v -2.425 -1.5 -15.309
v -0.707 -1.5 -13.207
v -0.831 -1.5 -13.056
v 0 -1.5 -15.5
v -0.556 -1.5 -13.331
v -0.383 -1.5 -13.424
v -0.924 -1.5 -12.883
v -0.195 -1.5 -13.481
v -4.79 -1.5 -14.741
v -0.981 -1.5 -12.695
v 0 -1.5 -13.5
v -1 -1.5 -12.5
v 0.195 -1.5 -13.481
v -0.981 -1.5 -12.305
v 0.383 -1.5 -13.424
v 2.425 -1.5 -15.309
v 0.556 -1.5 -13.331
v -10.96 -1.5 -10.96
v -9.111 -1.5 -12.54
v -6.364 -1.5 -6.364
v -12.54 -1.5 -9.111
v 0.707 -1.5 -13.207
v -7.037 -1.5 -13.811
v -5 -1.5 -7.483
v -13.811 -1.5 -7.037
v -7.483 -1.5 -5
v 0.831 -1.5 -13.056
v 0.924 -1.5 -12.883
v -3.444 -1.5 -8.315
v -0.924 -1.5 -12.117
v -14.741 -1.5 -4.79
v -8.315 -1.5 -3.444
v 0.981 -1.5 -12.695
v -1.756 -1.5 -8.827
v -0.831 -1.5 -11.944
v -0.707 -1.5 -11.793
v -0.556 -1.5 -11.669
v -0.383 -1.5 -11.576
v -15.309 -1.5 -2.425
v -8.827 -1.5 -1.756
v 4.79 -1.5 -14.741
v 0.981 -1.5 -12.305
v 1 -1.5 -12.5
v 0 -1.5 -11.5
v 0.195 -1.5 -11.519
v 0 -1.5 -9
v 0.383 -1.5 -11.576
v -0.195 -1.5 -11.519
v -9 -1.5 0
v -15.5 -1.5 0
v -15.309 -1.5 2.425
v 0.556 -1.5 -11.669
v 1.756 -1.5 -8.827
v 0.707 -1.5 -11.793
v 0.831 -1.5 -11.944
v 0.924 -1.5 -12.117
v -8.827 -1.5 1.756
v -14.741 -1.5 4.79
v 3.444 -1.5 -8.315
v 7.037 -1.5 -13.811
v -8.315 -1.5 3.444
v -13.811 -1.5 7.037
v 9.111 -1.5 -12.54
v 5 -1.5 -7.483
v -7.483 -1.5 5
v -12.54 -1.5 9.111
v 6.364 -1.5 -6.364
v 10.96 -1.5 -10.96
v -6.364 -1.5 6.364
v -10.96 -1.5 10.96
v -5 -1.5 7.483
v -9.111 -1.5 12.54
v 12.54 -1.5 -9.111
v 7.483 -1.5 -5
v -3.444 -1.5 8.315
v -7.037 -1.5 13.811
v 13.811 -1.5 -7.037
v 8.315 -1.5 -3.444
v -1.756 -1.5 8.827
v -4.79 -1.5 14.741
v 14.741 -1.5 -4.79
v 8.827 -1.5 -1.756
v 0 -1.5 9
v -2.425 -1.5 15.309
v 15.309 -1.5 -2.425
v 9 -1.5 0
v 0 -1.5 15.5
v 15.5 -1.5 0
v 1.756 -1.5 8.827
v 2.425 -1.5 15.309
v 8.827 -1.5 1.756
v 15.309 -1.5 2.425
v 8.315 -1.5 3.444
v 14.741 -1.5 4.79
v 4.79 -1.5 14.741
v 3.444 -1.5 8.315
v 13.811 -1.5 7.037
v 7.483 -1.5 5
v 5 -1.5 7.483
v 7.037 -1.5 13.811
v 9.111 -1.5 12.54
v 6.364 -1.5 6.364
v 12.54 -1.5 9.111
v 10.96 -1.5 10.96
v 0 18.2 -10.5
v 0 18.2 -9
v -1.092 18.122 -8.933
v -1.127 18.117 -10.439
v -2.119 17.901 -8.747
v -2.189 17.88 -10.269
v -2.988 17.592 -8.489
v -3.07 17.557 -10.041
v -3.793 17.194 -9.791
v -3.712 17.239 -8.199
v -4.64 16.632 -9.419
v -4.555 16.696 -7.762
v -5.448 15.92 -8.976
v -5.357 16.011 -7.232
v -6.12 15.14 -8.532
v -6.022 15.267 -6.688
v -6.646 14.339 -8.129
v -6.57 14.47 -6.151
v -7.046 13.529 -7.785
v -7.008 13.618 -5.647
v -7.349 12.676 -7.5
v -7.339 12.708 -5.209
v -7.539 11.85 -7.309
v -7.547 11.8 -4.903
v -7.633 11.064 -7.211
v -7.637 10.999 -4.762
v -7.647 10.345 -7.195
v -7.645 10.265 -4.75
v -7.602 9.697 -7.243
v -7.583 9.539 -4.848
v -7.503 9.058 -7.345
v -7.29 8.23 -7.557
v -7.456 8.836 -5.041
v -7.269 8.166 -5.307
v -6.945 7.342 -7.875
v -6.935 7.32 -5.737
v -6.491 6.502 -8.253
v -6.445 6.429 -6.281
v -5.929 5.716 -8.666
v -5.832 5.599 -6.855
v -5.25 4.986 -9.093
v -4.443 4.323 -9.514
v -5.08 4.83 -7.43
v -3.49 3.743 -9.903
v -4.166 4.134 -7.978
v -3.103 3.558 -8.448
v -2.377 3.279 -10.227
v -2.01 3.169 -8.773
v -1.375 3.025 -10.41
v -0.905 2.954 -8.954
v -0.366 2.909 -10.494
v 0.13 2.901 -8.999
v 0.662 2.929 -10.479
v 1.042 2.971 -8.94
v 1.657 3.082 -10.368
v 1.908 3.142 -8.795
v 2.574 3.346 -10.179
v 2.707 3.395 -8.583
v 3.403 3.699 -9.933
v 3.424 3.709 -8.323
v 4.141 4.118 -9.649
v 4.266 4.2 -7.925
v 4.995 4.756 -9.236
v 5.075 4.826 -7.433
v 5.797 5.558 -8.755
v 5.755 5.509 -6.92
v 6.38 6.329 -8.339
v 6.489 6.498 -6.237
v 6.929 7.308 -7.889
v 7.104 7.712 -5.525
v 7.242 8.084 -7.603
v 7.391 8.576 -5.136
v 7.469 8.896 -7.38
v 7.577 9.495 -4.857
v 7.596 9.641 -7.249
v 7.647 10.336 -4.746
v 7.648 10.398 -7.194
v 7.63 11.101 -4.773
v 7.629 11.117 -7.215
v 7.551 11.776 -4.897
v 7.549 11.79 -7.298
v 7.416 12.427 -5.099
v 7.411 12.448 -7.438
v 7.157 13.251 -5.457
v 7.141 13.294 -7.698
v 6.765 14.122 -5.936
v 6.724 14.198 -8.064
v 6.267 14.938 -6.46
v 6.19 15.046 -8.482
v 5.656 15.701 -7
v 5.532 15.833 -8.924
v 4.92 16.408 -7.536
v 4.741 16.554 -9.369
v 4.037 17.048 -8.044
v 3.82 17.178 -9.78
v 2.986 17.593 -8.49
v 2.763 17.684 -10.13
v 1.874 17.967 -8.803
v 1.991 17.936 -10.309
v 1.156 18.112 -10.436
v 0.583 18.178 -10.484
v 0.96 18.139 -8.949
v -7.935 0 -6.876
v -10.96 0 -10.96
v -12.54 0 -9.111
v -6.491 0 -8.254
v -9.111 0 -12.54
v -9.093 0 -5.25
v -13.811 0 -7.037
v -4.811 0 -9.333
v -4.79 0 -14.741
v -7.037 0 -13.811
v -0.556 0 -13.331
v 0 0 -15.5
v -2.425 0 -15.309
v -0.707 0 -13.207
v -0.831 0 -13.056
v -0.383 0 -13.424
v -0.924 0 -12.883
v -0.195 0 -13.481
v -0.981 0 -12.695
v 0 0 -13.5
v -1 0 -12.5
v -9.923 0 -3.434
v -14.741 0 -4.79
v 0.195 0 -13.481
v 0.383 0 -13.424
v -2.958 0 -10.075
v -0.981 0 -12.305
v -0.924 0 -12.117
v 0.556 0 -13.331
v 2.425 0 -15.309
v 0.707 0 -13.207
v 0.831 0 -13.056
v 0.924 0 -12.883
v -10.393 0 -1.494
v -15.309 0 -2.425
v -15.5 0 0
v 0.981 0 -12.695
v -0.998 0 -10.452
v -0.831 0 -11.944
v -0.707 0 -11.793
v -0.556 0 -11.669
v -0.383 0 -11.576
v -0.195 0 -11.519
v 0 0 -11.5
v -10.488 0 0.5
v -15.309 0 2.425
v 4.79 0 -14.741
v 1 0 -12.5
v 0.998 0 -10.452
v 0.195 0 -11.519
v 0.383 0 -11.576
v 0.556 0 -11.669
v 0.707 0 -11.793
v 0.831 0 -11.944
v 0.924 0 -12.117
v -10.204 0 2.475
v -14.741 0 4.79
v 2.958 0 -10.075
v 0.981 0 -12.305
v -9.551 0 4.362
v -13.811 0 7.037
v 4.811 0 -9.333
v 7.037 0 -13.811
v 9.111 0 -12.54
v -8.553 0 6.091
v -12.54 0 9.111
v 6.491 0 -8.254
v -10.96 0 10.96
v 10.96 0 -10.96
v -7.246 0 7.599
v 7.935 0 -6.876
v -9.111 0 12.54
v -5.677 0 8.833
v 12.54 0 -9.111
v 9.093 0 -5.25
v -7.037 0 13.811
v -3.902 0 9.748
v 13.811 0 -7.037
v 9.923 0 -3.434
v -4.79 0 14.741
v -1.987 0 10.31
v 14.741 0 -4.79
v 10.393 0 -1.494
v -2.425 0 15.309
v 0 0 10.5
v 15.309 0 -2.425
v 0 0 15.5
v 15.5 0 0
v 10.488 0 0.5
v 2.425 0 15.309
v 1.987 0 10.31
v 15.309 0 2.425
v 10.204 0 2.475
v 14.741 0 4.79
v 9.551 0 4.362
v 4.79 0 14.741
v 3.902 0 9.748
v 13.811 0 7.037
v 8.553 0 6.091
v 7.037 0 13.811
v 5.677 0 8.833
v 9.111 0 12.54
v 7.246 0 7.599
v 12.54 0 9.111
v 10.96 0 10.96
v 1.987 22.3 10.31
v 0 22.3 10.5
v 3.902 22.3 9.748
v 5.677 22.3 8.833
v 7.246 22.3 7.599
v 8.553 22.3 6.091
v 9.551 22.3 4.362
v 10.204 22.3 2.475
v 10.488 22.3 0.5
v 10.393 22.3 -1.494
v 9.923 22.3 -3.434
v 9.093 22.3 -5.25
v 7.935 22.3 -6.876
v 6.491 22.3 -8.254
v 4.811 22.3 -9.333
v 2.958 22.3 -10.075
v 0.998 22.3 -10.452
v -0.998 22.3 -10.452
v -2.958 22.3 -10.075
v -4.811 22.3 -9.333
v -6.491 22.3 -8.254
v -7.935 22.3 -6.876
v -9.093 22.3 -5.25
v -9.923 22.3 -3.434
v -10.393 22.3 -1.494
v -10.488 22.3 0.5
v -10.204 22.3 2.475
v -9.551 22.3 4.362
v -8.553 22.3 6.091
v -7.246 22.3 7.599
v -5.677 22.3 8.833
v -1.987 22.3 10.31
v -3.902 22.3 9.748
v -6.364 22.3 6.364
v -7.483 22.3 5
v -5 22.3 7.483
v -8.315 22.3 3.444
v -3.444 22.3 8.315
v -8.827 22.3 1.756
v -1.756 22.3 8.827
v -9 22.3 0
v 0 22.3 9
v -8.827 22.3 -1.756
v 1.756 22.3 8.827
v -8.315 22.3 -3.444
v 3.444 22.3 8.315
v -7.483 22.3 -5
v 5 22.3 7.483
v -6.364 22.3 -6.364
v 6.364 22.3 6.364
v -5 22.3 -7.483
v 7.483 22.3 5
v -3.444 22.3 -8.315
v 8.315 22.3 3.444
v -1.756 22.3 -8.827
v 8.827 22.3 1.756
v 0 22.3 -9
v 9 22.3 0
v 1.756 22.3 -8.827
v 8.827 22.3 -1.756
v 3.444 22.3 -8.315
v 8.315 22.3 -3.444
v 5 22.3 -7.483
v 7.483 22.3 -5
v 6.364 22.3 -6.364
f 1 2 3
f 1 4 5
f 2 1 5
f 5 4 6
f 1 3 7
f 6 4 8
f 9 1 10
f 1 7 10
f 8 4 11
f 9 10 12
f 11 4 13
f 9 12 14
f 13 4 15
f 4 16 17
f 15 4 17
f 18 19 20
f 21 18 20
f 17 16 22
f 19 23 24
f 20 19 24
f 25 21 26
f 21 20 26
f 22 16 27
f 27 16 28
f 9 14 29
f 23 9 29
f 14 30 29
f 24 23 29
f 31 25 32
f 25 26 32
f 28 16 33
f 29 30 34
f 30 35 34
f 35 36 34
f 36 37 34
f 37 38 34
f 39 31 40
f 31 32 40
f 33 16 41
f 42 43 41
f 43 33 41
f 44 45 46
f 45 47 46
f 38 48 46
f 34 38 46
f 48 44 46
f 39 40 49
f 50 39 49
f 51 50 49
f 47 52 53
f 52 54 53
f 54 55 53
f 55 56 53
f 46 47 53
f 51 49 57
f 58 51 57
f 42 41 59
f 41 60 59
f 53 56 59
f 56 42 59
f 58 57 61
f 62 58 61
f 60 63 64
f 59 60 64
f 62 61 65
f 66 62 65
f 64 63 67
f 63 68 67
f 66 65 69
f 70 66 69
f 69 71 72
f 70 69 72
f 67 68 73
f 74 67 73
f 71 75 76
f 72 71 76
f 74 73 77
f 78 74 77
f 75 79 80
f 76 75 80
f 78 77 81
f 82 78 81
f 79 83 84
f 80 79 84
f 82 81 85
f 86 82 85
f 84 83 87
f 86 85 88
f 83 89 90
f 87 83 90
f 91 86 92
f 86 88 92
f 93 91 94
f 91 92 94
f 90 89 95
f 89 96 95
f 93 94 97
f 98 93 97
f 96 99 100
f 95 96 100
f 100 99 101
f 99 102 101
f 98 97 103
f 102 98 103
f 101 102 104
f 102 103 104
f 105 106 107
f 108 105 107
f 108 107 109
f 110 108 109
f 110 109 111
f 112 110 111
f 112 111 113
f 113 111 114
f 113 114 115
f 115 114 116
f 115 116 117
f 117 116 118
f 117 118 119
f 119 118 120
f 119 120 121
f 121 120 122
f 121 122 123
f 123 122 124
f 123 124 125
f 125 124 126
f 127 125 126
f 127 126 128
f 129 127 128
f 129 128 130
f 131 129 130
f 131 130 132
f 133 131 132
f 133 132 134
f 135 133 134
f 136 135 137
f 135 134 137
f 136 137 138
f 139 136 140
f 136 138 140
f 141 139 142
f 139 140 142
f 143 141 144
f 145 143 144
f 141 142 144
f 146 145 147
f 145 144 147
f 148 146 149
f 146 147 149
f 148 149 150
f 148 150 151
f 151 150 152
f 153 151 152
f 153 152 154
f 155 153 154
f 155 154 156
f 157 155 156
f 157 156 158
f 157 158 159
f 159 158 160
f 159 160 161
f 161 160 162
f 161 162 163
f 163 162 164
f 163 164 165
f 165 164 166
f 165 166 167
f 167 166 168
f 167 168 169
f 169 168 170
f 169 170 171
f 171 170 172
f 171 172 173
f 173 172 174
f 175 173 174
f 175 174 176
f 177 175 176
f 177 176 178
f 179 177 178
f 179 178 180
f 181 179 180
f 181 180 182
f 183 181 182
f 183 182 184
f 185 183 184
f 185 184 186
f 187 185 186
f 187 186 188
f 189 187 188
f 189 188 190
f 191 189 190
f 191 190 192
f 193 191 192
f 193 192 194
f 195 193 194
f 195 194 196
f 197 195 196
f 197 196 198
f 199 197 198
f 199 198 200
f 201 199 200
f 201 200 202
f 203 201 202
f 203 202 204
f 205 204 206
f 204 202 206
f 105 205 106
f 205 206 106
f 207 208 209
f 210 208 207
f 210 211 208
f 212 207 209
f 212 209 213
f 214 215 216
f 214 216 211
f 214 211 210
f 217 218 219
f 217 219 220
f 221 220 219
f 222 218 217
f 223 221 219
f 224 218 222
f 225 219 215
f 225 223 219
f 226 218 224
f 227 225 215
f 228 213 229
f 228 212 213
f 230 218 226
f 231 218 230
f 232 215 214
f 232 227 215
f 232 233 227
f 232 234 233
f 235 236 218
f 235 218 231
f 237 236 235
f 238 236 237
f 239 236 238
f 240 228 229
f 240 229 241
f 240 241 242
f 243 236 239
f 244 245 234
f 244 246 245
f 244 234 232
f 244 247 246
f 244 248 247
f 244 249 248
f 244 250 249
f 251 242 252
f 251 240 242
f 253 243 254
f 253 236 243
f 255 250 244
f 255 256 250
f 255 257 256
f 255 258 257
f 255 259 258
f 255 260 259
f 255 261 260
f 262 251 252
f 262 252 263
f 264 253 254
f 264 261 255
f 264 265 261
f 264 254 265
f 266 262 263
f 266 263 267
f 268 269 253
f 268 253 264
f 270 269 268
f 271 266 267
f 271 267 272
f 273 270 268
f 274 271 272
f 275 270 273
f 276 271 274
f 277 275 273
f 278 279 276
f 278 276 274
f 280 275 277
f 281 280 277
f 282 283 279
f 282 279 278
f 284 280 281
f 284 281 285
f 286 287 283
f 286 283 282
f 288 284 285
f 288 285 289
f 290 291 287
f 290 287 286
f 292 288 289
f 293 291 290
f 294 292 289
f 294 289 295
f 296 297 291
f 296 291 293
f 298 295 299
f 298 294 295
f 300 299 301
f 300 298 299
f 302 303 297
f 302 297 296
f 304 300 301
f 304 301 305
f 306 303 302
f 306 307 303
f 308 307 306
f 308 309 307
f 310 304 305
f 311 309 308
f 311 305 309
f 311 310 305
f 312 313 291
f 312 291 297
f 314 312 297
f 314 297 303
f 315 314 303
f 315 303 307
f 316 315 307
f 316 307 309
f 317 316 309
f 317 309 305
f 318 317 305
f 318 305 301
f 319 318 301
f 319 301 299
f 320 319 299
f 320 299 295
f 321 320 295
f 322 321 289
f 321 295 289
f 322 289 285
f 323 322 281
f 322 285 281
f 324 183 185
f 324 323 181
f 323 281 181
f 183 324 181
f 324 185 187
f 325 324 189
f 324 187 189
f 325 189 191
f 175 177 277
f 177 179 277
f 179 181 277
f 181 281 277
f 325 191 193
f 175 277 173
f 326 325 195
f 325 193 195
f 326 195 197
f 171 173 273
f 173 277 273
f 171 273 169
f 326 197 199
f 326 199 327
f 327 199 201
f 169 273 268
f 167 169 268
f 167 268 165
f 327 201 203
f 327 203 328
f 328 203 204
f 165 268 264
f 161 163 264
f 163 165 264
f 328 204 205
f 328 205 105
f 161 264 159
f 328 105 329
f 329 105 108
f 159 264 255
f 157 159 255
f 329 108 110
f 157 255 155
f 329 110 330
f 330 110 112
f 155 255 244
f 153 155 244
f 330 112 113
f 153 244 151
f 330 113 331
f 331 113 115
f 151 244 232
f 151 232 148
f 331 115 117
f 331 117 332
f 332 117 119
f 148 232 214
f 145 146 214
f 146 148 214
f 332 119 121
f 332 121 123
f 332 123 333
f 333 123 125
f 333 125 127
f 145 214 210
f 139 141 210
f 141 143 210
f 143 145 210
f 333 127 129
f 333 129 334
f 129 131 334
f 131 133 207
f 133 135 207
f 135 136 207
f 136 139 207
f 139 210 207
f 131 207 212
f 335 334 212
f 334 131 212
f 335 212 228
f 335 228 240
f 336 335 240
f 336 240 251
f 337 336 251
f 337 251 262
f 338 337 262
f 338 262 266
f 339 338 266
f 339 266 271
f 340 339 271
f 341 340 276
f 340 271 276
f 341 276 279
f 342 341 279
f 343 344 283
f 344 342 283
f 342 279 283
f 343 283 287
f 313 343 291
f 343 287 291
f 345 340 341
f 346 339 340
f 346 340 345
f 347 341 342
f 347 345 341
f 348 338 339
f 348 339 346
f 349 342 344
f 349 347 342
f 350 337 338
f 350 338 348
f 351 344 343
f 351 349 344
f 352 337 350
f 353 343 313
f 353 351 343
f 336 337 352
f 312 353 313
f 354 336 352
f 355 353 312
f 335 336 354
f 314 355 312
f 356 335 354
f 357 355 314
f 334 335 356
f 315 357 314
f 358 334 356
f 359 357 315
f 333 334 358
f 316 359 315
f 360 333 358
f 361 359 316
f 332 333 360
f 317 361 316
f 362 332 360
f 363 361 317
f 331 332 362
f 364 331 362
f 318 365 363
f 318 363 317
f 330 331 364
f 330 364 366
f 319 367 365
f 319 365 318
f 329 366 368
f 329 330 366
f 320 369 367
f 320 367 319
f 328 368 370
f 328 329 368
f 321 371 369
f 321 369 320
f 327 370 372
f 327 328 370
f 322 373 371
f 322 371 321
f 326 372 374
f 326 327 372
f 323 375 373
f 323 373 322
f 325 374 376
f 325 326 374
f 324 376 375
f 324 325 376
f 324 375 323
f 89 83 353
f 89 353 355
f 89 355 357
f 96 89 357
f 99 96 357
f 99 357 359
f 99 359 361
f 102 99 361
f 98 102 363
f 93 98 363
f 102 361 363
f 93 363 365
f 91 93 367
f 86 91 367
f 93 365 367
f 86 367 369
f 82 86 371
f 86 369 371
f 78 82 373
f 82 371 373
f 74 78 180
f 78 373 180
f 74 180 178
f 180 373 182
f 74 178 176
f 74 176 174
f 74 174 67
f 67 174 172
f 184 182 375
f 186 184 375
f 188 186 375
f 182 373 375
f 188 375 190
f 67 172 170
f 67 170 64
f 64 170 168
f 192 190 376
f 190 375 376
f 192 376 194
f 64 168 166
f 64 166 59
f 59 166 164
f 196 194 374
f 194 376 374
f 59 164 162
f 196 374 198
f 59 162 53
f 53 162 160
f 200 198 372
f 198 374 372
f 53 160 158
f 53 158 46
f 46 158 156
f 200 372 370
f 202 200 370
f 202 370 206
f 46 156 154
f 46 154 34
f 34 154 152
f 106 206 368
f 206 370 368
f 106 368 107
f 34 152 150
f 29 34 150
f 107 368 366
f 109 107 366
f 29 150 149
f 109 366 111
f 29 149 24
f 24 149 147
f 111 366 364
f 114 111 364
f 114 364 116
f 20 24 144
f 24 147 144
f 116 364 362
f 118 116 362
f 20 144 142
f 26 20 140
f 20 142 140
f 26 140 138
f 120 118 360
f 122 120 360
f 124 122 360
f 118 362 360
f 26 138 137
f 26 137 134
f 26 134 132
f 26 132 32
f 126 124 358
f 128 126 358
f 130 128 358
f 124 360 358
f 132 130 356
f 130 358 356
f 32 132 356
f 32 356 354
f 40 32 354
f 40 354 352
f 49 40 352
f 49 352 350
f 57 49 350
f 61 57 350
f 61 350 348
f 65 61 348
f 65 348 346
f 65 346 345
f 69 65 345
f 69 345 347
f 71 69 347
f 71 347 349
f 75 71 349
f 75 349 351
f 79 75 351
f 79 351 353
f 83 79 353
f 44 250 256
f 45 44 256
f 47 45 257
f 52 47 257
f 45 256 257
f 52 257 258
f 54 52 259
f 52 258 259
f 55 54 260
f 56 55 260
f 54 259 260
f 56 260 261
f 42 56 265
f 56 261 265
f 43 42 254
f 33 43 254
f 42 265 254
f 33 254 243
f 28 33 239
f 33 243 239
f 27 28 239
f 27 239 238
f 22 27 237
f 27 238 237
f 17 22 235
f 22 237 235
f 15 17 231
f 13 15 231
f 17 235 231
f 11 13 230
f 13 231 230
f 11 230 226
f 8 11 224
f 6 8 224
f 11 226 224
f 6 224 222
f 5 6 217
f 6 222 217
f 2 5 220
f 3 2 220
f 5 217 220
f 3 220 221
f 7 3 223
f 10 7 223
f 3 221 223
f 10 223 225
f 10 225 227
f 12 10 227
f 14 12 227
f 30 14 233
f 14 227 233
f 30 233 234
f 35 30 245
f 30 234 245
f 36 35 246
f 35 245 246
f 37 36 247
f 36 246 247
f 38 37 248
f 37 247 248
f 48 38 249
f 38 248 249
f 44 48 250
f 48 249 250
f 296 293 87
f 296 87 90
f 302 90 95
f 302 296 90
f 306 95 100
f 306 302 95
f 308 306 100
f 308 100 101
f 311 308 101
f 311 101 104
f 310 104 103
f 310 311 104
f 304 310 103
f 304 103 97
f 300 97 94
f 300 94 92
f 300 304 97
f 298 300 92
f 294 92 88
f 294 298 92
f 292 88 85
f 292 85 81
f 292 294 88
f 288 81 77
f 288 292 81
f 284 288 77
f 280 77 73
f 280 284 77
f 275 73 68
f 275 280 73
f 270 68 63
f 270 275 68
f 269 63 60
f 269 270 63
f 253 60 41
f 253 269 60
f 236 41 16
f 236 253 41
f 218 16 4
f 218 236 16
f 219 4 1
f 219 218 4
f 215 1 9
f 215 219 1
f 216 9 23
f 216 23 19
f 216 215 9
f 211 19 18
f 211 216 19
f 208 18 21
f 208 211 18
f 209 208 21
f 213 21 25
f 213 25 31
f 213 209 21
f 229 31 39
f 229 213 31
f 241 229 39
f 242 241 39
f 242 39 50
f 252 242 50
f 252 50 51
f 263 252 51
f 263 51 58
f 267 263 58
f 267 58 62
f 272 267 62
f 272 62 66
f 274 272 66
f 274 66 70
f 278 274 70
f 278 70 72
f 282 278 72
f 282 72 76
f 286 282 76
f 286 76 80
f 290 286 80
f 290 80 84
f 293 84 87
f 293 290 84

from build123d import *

# Parameters (mm, degrees)
SKETCH1_R           = 10.5
SKETCH1_R_2         = 9
BOSS_EXTRUDE1_DEPTH = 38.3
SKETCH2_R           = 15.5
SKETCH2_R_2         = 9
SKETCH2_R_3         = 1
BOSS_EXTRUDE2_DEPTH = 1.5
SKETCH10_R          = 7.65
CUT_EXTRUDE1_DEPTH  = 46.437209421
SKETCH15_R          = 20.755300819
CUT_EXTRUDE3_DEPTH  = 17.5


with BuildPart() as part:
    # Sketch1 → Boss-Extrude1 (new body)
    with BuildSketch(Plane(origin=(0, 0, 0), x_dir=(1, 0, 0), z_dir=(0, 1, 0))):
        with Locations(Location((0, 0, 0), (0, 0, 270))):
            Circle(SKETCH1_R)
        with Locations(Location((0, 0, 0), (0, 0, 270))):
            Circle(SKETCH1_R_2, mode=Mode.SUBTRACT)
    extrude(amount=BOSS_EXTRUDE1_DEPTH)

    # Sketch2 → Boss-Extrude2 (add)
    with BuildSketch(Plane(origin=(0, 38.3, 0), x_dir=(1, 0, 0), z_dir=(0, 1, 0))):
        with Locations(Location((0, 0, 0), (0, 0, 270))):
            Circle(SKETCH2_R)
        with Locations(Location((0, 0, 0), (0, 0, 270))):
            Circle(SKETCH2_R_2, mode=Mode.SUBTRACT)
        with Locations(Location((0, 12.5, 0), (0, 0, 270))):
            Circle(SKETCH2_R_3, mode=Mode.SUBTRACT)
    boss_extrude2 = extrude(amount=BOSS_EXTRUDE2_DEPTH)

    # Mirror1: Boss-Extrude2 across plane
    add(boss_extrude2.mirror(Plane(origin=(0, 19.15, 0), x_dir=(0, 0, 1), z_dir=(0, -1, 0))))

    # Sketch10 → Cut-Extrude1 (cut, through all)
    with BuildSketch(Plane.XY):
        with Locations(Location((0, 10.55, 0), (0, 0, 90))):
            Circle(SKETCH10_R)
    extrude(amount=-CUT_EXTRUDE1_DEPTH, mode=Mode.SUBTRACT)

    # Sketch15 → Cut-Extrude3 (cut)
    with BuildSketch(Plane(origin=(0, 39.8, 0), x_dir=(1, 0, 0), z_dir=(0, 1, 0))):
        Circle(SKETCH15_R)
    extrude(amount=-CUT_EXTRUDE3_DEPTH, mode=Mode.SUBTRACT)


solid = part.part
